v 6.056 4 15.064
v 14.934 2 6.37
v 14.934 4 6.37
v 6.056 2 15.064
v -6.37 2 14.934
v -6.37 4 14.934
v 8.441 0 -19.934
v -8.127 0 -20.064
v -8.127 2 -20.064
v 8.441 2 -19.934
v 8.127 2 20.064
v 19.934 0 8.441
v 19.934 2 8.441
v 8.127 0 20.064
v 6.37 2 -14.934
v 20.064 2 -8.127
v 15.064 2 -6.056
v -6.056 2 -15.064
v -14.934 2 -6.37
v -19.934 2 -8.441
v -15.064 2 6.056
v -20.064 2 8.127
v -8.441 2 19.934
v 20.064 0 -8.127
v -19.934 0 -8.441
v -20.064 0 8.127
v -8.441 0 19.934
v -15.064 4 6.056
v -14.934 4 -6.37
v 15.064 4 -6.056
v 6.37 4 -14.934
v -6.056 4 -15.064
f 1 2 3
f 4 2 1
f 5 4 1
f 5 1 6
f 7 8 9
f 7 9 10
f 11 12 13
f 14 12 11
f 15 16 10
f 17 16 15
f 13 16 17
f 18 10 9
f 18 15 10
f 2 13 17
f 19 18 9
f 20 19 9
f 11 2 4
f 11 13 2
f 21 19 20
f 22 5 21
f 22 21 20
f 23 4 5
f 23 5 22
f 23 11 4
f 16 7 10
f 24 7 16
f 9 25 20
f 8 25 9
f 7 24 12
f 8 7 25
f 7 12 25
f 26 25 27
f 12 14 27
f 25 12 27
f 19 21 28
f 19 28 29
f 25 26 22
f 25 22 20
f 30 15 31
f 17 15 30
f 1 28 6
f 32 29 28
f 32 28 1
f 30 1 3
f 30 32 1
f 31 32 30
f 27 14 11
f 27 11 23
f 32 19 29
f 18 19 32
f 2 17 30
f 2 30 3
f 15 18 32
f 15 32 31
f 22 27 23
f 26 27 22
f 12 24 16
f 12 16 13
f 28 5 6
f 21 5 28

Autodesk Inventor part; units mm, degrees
ref_plane "YZ Plane" through (0, 0, 0) normal (1, 0, 0) x (0, 1, 0)
ref_plane "XZ Plane" through (0, 0, 0) normal (0, 1, 0) x (-1, 0, 0)
ref_plane "XY Plane" through (0, 0, 0) normal (0, 0, 1) x (1, 0, 0)
sketch "Sketch1" plane through (0, 0, 0) normal (0, 1, 0) x (-1, 0, 0)
  line L0 (20.0643, 8.1272) -> (19.9344, -8.4408)
  line L1 (19.9344, -8.4408) -> (8.1272, -20.0643)
  line L2 (8.1272, -20.0643) -> (-8.4408, -19.9344)
  line L3 (-8.4408, -19.9344) -> (-20.0643, -8.1272)
  line L4 (-20.0643, -8.1272) -> (-19.9344, 8.4408)
  line L5 (-19.9344, 8.4408) -> (-8.1272, 20.0643)
  line L6 (-8.1272, 20.0643) -> (8.4408, 19.9344)
  line L7 (8.4408, 19.9344) -> (20.0643, 8.1272)
  point P0 (0, 0)
  point P1 (0, 0)
  dimension "d0" = 20
  dimension "d1" = 16.568
extrude "Extrusion1" add sketch "Sketch1" along normal blind 2
sketch "Sketch2" plane through (0, 2, 0) normal (0, 1, 0) x (1, 0, 0)
  line L0 (15.0642, 6.0559) -> (14.9342, -6.3698)
  line L1 (14.9342, -6.3698) -> (6.0559, -15.0642)
  line L2 (6.0559, -15.0642) -> (-6.3698, -14.9342)
  line L3 (-6.3698, -14.9342) -> (-15.0642, -6.0559)
  line L4 (-15.0642, -6.0559) -> (-14.9342, 6.3698)
  line L5 (-14.9342, 6.3698) -> (-6.0559, 15.0642)
  line L6 (-6.0559, 15.0642) -> (6.3698, 14.9342)
  line L7 (6.3698, 14.9342) -> (15.0642, 6.0559)
  point P0 (0, 0)
  point P1 (0, 0)
  dimension "d4" = 15
  dimension "d5" = 12.4257
extrude "Extrusion2" add sketch "Sketch2" along normal blind 2
properties part number "oktagonUnten"
